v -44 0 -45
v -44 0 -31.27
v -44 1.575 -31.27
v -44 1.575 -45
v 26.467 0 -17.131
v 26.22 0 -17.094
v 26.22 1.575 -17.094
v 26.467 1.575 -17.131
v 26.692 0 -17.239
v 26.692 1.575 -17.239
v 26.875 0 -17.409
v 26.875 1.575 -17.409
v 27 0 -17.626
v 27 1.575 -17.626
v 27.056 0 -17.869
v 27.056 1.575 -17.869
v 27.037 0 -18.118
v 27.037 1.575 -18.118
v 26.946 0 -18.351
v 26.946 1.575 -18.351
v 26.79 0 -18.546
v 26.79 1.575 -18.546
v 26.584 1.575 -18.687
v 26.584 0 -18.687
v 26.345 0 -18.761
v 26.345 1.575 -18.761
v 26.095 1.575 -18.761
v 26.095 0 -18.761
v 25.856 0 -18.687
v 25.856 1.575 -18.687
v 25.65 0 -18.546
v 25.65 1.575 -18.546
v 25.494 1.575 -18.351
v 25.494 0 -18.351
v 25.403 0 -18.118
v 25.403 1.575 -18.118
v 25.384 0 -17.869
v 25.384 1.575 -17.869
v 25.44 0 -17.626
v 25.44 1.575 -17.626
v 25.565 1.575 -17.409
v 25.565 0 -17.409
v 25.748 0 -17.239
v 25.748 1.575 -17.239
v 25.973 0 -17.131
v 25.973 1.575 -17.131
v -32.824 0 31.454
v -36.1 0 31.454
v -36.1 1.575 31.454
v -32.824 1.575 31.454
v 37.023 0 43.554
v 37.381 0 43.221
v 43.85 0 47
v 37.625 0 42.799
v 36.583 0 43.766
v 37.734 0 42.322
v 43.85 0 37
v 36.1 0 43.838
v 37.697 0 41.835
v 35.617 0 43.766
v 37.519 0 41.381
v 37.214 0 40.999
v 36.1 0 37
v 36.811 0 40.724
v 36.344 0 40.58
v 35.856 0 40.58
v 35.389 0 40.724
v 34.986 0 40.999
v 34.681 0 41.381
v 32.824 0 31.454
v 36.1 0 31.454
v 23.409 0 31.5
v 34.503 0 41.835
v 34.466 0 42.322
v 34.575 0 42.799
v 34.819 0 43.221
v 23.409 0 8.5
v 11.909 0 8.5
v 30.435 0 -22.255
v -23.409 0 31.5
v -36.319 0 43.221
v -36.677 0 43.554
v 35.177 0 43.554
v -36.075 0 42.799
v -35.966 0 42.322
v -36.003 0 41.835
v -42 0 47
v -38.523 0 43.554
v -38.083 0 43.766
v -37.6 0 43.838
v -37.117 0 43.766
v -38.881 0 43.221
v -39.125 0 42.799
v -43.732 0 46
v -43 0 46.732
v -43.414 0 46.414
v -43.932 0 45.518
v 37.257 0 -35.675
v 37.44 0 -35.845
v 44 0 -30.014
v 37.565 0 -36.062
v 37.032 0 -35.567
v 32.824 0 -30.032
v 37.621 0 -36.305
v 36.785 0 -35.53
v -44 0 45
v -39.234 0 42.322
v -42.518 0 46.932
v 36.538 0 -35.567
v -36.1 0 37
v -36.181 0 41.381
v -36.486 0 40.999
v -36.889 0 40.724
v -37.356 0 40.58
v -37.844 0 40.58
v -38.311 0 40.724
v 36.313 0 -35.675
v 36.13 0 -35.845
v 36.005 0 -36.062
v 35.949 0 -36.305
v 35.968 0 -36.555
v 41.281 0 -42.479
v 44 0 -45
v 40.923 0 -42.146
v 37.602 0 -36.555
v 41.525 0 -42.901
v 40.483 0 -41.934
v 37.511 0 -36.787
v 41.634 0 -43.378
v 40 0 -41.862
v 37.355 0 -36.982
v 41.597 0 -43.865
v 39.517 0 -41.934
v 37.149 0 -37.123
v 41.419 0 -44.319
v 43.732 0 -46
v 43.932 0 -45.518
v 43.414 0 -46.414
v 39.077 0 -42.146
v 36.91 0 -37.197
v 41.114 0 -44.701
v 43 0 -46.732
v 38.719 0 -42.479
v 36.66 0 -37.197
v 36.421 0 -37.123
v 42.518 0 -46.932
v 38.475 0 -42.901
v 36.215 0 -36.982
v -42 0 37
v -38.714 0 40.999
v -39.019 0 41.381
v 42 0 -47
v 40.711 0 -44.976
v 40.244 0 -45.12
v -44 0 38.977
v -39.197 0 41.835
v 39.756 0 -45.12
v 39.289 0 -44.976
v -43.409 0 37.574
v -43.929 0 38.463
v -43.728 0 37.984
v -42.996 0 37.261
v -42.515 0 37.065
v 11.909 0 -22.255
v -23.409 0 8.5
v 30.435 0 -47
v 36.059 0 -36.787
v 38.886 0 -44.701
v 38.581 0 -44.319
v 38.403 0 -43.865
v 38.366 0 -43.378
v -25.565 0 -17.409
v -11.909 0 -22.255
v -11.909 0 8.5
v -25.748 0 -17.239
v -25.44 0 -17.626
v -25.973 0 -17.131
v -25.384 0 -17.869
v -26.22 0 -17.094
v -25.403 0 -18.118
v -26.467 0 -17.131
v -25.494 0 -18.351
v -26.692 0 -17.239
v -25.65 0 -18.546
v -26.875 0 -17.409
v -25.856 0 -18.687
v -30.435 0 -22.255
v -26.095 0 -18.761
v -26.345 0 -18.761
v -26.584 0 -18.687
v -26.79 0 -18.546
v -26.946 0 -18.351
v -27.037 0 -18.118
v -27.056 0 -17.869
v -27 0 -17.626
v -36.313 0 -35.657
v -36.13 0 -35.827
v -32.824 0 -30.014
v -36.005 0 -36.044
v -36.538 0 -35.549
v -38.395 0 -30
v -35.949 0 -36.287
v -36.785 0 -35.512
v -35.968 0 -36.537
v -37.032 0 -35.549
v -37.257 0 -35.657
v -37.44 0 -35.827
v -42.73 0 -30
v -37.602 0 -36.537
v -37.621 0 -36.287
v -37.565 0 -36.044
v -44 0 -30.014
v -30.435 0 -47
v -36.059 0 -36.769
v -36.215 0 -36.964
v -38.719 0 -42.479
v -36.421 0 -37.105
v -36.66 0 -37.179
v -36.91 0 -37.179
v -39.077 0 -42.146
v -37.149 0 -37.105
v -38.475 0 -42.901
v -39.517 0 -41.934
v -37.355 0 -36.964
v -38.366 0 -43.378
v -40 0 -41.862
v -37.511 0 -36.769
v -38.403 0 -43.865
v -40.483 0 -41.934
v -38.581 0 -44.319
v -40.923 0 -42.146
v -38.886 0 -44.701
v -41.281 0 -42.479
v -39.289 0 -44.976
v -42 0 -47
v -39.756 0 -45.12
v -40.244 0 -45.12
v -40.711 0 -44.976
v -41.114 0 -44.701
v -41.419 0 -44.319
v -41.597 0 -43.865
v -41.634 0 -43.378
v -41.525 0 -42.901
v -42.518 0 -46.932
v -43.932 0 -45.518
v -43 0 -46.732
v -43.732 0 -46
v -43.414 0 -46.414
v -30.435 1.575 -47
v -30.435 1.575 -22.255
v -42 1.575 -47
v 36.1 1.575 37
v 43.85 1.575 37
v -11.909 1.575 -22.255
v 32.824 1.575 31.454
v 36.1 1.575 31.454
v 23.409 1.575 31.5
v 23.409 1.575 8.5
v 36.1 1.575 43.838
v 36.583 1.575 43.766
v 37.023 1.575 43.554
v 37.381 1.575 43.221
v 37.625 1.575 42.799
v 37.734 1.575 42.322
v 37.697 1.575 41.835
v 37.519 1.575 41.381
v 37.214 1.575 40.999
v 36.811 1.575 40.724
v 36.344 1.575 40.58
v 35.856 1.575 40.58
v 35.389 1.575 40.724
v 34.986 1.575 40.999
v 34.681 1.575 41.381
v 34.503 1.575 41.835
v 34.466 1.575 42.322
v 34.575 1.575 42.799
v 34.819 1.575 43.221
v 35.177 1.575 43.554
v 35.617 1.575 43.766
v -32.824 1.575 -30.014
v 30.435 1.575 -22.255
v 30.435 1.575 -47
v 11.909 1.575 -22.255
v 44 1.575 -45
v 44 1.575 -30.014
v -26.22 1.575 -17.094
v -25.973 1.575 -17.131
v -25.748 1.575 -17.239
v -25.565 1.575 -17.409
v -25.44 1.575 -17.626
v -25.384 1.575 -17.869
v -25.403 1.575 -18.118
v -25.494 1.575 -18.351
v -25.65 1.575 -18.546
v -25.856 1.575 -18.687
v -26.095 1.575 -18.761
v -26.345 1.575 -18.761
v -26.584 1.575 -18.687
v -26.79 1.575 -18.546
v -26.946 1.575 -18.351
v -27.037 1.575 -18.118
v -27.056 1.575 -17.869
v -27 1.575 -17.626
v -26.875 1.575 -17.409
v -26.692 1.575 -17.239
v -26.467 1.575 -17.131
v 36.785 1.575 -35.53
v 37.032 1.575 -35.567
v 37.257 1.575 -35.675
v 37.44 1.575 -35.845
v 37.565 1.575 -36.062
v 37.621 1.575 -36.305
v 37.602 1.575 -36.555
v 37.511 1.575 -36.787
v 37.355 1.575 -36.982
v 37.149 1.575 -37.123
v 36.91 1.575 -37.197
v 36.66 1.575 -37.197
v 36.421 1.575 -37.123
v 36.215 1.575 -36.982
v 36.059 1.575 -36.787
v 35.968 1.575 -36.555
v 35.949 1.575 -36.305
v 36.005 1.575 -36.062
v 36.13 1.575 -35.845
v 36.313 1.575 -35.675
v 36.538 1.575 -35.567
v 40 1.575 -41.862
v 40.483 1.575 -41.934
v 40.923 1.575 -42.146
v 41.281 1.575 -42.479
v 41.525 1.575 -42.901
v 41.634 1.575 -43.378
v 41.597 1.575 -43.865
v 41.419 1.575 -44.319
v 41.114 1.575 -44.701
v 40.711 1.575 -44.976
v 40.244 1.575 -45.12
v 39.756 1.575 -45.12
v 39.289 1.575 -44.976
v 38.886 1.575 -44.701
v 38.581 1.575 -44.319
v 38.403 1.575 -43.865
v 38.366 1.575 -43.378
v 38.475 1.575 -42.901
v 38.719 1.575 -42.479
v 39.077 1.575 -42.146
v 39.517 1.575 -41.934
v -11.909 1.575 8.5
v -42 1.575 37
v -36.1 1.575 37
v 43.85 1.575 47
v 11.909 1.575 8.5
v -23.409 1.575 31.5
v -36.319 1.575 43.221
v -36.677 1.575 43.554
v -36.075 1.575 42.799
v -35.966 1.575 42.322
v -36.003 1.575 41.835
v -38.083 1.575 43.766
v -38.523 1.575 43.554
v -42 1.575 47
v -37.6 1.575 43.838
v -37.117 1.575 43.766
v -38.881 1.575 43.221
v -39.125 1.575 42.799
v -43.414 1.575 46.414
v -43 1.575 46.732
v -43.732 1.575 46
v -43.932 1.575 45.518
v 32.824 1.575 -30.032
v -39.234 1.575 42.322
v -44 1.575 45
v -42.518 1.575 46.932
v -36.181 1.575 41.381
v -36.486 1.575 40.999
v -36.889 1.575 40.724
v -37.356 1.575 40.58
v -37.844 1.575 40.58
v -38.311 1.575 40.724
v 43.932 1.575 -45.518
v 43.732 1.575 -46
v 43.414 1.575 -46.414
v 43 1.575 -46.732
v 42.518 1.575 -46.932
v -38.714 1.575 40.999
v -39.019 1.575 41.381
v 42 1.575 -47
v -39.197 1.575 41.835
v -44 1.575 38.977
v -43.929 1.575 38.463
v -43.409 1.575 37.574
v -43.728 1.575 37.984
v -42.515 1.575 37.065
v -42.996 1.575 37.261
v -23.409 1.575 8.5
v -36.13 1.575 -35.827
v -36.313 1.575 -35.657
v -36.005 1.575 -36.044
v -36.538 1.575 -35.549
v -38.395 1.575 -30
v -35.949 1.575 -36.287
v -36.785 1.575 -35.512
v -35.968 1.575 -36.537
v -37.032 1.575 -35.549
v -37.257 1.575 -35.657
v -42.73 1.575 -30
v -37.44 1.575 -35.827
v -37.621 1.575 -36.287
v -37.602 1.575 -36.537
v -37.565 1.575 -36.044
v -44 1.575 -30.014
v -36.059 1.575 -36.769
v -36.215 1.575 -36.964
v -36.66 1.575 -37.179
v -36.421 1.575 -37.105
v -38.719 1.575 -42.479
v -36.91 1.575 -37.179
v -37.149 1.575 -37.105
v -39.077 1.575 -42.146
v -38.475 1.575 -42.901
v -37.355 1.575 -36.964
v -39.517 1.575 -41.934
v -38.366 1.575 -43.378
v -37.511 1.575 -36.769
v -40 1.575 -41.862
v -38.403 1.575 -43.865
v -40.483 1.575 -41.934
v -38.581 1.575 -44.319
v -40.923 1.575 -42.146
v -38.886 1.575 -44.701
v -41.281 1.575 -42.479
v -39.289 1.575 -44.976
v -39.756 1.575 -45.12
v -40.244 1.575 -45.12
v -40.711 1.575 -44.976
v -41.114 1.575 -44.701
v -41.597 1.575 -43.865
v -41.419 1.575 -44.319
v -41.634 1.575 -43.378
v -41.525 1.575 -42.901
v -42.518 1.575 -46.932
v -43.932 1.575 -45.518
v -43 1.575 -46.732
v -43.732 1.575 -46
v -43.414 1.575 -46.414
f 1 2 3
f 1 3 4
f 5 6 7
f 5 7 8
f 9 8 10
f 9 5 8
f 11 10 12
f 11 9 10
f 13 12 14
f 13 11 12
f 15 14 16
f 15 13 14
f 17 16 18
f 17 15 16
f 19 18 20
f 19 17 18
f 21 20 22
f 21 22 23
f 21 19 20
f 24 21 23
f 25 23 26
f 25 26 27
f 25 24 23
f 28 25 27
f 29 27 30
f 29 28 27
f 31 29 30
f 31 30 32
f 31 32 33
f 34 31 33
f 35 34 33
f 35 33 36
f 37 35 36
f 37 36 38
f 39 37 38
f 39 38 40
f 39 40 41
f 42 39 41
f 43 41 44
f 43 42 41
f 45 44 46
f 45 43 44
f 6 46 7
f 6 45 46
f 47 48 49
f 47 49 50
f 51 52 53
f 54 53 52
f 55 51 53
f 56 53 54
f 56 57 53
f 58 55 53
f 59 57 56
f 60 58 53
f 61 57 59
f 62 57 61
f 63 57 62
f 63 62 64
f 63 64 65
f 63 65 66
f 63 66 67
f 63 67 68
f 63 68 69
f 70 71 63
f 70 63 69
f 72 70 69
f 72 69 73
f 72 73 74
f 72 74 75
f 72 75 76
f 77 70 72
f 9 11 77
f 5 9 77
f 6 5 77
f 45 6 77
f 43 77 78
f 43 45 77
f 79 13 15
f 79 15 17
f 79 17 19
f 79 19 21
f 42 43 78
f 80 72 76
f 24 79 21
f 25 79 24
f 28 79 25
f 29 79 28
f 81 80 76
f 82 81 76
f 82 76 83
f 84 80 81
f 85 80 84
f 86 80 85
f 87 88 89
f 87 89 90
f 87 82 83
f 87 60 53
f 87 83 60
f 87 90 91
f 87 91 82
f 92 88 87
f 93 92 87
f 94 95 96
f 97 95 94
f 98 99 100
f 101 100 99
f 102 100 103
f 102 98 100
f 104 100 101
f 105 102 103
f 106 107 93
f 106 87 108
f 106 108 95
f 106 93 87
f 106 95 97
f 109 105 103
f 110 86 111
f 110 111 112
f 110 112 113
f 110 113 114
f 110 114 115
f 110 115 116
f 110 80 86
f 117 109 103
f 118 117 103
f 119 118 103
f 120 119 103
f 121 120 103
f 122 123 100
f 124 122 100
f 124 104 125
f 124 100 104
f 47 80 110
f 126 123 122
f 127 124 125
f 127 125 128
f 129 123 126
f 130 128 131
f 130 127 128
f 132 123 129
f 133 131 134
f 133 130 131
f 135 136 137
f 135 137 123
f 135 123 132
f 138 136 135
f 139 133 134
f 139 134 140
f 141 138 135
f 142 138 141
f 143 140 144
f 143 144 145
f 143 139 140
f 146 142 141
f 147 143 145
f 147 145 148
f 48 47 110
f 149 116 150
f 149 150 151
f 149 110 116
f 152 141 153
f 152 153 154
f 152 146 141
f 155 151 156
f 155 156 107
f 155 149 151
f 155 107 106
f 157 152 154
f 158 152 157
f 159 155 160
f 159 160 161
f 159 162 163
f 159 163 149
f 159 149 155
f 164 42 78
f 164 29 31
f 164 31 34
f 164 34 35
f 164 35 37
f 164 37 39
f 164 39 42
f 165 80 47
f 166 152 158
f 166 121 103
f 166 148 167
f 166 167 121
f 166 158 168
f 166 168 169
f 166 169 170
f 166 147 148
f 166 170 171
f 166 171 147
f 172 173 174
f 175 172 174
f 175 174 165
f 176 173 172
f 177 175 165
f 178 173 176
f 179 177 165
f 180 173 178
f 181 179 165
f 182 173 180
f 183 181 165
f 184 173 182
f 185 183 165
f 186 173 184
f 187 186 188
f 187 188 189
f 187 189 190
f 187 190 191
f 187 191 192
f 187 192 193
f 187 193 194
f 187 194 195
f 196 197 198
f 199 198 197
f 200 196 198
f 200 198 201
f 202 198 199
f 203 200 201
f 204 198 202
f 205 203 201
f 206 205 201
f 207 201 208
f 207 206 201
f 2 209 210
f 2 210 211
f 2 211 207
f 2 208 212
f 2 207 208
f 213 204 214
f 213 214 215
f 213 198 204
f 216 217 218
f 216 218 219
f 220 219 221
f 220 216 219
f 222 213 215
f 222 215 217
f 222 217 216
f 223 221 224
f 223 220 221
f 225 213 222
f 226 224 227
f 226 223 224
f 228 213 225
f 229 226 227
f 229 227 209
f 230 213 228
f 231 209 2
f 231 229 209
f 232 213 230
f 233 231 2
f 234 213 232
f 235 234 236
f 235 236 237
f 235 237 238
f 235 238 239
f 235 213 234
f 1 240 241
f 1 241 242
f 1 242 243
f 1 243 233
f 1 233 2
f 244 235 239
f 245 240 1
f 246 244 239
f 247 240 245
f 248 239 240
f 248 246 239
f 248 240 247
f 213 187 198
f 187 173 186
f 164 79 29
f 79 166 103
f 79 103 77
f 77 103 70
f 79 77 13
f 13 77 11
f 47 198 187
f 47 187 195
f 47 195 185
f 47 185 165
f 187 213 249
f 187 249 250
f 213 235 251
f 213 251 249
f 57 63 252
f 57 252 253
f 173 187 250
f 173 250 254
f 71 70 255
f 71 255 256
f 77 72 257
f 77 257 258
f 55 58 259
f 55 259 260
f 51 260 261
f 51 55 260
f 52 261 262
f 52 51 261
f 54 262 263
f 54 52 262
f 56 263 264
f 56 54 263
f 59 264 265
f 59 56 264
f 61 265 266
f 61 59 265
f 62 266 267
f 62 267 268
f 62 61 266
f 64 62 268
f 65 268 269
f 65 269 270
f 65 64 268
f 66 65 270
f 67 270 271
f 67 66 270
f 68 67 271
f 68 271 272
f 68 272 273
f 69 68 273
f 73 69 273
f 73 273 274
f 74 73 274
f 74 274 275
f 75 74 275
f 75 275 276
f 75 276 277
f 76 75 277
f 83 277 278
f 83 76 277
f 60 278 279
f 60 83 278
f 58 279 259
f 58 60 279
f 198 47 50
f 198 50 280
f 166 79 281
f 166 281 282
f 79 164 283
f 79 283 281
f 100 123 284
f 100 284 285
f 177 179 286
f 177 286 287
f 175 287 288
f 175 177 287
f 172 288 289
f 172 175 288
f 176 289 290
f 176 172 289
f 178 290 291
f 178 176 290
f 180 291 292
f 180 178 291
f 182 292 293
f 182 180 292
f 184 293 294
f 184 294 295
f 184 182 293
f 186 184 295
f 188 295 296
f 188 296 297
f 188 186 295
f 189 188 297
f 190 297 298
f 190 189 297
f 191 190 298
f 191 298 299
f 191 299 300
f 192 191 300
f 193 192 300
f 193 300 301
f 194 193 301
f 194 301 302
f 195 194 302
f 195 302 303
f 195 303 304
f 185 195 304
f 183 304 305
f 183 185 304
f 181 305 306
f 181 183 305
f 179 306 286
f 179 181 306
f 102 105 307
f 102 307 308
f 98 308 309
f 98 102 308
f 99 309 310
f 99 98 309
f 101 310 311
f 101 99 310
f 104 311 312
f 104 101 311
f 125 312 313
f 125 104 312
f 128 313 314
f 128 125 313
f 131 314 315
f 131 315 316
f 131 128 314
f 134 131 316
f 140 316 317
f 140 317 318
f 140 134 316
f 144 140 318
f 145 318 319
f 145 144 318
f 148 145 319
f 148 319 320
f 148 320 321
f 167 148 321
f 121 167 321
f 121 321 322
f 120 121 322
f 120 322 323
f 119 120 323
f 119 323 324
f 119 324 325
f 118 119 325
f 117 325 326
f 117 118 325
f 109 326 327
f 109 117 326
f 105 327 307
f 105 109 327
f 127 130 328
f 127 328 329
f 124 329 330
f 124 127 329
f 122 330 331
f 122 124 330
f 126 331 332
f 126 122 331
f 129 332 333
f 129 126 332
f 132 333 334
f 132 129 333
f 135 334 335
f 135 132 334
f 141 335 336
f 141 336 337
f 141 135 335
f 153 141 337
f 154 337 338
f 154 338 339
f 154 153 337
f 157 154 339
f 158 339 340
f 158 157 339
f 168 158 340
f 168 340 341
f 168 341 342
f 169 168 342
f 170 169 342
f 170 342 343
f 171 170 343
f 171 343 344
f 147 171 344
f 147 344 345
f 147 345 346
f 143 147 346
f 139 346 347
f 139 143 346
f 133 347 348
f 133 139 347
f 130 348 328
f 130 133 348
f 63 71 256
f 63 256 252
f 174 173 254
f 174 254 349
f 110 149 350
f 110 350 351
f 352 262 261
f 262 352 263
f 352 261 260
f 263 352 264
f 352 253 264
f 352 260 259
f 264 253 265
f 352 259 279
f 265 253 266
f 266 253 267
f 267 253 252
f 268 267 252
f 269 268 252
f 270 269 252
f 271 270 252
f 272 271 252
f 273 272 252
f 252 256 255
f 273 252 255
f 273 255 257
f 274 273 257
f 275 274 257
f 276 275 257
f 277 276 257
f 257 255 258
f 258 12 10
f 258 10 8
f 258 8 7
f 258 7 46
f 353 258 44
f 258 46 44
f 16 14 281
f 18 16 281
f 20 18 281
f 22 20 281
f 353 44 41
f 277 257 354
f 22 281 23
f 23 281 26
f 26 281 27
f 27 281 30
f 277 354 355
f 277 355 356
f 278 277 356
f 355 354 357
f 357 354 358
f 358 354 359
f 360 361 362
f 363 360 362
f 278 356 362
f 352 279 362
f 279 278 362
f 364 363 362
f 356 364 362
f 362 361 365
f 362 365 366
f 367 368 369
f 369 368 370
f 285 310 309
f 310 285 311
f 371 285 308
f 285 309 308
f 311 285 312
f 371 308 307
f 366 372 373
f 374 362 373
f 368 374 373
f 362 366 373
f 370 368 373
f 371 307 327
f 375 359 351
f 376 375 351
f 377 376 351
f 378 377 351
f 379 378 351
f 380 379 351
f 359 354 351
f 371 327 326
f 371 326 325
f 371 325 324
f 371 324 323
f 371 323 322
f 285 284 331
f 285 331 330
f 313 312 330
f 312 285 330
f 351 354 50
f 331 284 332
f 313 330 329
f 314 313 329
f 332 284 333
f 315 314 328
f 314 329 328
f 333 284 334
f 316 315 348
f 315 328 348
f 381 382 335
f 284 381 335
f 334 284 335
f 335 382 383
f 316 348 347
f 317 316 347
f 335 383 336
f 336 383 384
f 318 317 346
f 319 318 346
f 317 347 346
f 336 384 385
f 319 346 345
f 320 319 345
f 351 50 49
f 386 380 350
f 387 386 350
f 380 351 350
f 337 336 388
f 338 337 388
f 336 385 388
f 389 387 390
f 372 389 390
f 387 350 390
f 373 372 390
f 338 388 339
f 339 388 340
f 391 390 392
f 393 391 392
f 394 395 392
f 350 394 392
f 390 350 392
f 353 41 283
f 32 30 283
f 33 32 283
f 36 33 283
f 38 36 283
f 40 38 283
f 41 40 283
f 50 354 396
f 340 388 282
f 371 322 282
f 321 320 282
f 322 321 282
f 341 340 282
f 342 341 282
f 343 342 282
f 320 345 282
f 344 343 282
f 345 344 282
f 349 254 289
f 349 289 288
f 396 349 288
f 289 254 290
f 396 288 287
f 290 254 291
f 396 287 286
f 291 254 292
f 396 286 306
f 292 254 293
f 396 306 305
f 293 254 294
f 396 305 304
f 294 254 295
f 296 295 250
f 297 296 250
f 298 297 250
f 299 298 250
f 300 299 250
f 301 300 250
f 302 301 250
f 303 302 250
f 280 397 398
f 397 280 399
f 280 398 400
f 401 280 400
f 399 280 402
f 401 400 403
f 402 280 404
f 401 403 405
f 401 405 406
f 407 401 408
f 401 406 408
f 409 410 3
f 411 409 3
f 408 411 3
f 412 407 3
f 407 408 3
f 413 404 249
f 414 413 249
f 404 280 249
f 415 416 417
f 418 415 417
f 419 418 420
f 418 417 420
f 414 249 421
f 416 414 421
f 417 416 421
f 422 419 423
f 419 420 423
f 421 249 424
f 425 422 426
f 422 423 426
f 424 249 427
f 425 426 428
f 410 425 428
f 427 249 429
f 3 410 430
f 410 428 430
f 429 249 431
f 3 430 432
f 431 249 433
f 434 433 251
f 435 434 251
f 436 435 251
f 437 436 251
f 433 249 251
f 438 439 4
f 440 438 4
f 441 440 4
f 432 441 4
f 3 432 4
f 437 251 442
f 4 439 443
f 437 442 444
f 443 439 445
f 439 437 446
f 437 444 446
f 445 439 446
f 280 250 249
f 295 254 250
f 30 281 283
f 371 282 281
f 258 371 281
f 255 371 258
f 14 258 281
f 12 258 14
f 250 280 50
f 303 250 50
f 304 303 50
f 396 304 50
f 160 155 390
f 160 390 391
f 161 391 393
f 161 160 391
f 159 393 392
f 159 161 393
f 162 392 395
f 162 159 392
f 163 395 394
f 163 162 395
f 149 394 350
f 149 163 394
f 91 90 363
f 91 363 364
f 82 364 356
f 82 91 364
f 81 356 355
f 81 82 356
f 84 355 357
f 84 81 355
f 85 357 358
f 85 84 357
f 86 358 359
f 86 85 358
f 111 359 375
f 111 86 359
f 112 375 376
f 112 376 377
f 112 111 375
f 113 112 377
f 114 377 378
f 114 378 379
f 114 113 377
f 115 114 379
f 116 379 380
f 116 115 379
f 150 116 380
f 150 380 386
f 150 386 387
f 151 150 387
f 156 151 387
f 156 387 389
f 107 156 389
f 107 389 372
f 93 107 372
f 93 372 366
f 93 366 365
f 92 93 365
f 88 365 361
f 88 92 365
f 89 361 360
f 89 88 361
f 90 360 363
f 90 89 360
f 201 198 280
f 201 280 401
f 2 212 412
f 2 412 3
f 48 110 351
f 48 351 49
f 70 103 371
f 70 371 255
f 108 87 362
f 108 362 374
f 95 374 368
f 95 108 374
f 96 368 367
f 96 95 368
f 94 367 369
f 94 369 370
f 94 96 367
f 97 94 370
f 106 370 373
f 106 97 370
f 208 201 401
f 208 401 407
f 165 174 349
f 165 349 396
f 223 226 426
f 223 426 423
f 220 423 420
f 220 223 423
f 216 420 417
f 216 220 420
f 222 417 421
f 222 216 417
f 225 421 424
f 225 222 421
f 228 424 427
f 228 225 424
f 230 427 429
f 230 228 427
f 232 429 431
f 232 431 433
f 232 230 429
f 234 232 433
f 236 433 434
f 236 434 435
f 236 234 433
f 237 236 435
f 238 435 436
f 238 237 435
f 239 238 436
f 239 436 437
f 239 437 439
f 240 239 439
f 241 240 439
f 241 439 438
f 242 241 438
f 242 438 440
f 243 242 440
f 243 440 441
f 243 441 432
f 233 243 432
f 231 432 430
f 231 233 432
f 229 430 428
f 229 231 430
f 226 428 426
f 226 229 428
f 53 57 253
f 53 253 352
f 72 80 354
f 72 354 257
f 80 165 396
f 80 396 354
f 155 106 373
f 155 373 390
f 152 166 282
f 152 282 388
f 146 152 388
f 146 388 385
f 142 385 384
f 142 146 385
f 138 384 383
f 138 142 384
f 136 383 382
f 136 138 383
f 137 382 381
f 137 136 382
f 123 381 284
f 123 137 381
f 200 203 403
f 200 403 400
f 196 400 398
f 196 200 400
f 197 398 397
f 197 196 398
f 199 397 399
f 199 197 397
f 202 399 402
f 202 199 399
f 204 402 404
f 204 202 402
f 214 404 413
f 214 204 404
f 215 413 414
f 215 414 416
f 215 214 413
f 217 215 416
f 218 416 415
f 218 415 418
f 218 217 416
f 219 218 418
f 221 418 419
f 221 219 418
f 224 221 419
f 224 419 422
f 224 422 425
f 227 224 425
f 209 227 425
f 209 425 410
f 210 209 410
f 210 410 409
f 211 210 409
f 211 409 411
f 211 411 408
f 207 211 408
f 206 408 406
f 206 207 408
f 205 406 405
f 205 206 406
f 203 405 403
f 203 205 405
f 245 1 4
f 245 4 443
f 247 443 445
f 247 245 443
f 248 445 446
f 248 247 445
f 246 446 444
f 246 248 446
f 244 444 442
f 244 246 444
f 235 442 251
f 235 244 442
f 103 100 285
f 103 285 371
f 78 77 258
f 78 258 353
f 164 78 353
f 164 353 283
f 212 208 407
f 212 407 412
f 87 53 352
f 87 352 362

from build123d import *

# Parameters (mm, degrees)
SKETCH1_R           = 1.6383
SKETCH1_R_2         = 0.8382
BOSS_EXTRUDE1_DEPTH = 1.575


with BuildPart() as part:
    # Sketch1 → Boss-Extrude1 (new body)
    with BuildSketch(Plane(origin=(0, 0, 0), x_dir=(1, 0, 0), z_dir=(0, 1, 0))):
        with BuildLine():
            Line((-38.39500299, 29.999999735), (-42.73000299, 29.999999735))
            Line((-42.73000299, 29.999999735), (-44.000003042, 30.013999735))
            Line((-44.000003042, 30.013999735), (-44.000003042, 31.269999735))
            Line((-44.000003042, 31.269999735), (-44.00000361, 44.999999735))
            ThreePointArc((-44.00000361, 44.999999735), (-43.414217128, 46.414213903), (-42.000002924, 47.000000297))
            Line((-42.000002924, 47.000000297), (-30.435003745, 47.000000297))
            Line((-30.435003745, 47.000000297), (-30.435002721, 22.255354587))
            Line((-30.435002721, 22.255354587), (-11.909002721, 22.255355354))
            Line((-11.909002721, 22.255355354), (-11.909002721, -8.5))
            Line((-11.909002721, -8.5), (-23.409001447, -8.5))
            Line((-23.409001447, -8.5), (-23.409000495, -31.499999412))
            Line((-23.409000495, -31.499999412), (23.408999505, -31.499997474))
            Line((23.408999505, -31.499997474), (23.408999505, -8.499997555))
            Line((23.408999505, -8.499997555), (11.908997279, -8.499997555))
            Line((11.908997279, -8.499997555), (11.908997279, 22.25535634))
            Line((11.908997279, 22.25535634), (30.434997279, 22.255357107))
            Line((30.434997279, 22.255357107), (30.434996255, 47.000002817))
            Line((30.434996255, 47.000002817), (41.999997246, 47.000002817))
            ThreePointArc((41.999997246, 47.000002817), (43.414210615, 46.414216484), (43.999996958, 45.000003119))
            Line((43.999996958, 45.000003119), (43.999996958, 32.000003378))
            Line((43.999996958, 32.000003378), (43.999996958, 30.014003378))
            Line((43.999996958, 30.014003378), (32.823996958, 30.032002916))
            Line((32.823996958, 30.032002916), (32.823999503, -31.453997084))
            Line((32.823999503, -31.453997084), (36.099999555, -31.453996949))
            Line((36.099999555, -31.453996949), (36.099999785, -36.999996949))
            Line((36.099999785, -36.999996949), (43.849731264, -36.999996949))
            Line((43.849731264, -36.999996949), (43.849731264, -46.999996628))
            Line((43.849731264, -46.999996628), (-42.000000215, -46.999996628))
            ThreePointArc((-42.000000215, -46.999996628), (-43.414212607, -46.414211361), (-44.000000215, -44.999999938))
            Line((-44.000000215, -44.999999938), (-44.000000215, -38.976999938))
            ThreePointArc((-44.000000215, -38.976999938), (-43.409460005, -37.574276579), (-42.000000215, -36.999999938))
            Line((-42.000000215, -36.999999938), (-38.395000215, -36.999999938))
            Line((-38.395000215, -36.999999938), (-36.100000319, -36.999999938))
            Line((-36.100000319, -36.999999938), (-36.100000549, -31.453999938))
            Line((-36.100000549, -31.453999938), (-32.824000497, -31.453999802))
            Line((-32.824000497, -31.453999802), (-32.824003042, 30.014000198))
            Line((-32.824003042, 30.014000198), (-38.39500299, 29.999999735))
        make_face()
        with Locations(Location((40, 43.5, 0), (0, 0, 270))):
            Circle(SKETCH1_R, mode=Mode.SUBTRACT)
        with Locations(Location((-40, 43.5, 0), (0, 0, 270))):
            Circle(SKETCH1_R, mode=Mode.SUBTRACT)
        with Locations(Location((-37.6, -42.2, 0), (0, 0, 270))):
            Circle(SKETCH1_R, mode=Mode.SUBTRACT)
        with Locations(Location((36.1, -42.2, 0), (0, 0, 270))):
            Circle(SKETCH1_R, mode=Mode.SUBTRACT)
        with Locations(Location((-36.785003304, 36.350000034, 0), (0, 0, 270))):
            Circle(SKETCH1_R_2, mode=Mode.SUBTRACT)
        with Locations(Location((-26.220002542, 17.93192918, 0), (0, 0, 270))):
            Circle(SKETCH1_R_2, mode=Mode.SUBTRACT)
        with Locations(Location((26.219997458, 17.931931351, 0), (0, 0, 270))):
            Circle(SKETCH1_R_2, mode=Mode.SUBTRACT)
        with Locations(Location((36.784996695, 36.36800308, 0), (0, 0, 270))):
            Circle(SKETCH1_R_2, mode=Mode.SUBTRACT)
    extrude(amount=BOSS_EXTRUDE1_DEPTH)


solid = part.part
